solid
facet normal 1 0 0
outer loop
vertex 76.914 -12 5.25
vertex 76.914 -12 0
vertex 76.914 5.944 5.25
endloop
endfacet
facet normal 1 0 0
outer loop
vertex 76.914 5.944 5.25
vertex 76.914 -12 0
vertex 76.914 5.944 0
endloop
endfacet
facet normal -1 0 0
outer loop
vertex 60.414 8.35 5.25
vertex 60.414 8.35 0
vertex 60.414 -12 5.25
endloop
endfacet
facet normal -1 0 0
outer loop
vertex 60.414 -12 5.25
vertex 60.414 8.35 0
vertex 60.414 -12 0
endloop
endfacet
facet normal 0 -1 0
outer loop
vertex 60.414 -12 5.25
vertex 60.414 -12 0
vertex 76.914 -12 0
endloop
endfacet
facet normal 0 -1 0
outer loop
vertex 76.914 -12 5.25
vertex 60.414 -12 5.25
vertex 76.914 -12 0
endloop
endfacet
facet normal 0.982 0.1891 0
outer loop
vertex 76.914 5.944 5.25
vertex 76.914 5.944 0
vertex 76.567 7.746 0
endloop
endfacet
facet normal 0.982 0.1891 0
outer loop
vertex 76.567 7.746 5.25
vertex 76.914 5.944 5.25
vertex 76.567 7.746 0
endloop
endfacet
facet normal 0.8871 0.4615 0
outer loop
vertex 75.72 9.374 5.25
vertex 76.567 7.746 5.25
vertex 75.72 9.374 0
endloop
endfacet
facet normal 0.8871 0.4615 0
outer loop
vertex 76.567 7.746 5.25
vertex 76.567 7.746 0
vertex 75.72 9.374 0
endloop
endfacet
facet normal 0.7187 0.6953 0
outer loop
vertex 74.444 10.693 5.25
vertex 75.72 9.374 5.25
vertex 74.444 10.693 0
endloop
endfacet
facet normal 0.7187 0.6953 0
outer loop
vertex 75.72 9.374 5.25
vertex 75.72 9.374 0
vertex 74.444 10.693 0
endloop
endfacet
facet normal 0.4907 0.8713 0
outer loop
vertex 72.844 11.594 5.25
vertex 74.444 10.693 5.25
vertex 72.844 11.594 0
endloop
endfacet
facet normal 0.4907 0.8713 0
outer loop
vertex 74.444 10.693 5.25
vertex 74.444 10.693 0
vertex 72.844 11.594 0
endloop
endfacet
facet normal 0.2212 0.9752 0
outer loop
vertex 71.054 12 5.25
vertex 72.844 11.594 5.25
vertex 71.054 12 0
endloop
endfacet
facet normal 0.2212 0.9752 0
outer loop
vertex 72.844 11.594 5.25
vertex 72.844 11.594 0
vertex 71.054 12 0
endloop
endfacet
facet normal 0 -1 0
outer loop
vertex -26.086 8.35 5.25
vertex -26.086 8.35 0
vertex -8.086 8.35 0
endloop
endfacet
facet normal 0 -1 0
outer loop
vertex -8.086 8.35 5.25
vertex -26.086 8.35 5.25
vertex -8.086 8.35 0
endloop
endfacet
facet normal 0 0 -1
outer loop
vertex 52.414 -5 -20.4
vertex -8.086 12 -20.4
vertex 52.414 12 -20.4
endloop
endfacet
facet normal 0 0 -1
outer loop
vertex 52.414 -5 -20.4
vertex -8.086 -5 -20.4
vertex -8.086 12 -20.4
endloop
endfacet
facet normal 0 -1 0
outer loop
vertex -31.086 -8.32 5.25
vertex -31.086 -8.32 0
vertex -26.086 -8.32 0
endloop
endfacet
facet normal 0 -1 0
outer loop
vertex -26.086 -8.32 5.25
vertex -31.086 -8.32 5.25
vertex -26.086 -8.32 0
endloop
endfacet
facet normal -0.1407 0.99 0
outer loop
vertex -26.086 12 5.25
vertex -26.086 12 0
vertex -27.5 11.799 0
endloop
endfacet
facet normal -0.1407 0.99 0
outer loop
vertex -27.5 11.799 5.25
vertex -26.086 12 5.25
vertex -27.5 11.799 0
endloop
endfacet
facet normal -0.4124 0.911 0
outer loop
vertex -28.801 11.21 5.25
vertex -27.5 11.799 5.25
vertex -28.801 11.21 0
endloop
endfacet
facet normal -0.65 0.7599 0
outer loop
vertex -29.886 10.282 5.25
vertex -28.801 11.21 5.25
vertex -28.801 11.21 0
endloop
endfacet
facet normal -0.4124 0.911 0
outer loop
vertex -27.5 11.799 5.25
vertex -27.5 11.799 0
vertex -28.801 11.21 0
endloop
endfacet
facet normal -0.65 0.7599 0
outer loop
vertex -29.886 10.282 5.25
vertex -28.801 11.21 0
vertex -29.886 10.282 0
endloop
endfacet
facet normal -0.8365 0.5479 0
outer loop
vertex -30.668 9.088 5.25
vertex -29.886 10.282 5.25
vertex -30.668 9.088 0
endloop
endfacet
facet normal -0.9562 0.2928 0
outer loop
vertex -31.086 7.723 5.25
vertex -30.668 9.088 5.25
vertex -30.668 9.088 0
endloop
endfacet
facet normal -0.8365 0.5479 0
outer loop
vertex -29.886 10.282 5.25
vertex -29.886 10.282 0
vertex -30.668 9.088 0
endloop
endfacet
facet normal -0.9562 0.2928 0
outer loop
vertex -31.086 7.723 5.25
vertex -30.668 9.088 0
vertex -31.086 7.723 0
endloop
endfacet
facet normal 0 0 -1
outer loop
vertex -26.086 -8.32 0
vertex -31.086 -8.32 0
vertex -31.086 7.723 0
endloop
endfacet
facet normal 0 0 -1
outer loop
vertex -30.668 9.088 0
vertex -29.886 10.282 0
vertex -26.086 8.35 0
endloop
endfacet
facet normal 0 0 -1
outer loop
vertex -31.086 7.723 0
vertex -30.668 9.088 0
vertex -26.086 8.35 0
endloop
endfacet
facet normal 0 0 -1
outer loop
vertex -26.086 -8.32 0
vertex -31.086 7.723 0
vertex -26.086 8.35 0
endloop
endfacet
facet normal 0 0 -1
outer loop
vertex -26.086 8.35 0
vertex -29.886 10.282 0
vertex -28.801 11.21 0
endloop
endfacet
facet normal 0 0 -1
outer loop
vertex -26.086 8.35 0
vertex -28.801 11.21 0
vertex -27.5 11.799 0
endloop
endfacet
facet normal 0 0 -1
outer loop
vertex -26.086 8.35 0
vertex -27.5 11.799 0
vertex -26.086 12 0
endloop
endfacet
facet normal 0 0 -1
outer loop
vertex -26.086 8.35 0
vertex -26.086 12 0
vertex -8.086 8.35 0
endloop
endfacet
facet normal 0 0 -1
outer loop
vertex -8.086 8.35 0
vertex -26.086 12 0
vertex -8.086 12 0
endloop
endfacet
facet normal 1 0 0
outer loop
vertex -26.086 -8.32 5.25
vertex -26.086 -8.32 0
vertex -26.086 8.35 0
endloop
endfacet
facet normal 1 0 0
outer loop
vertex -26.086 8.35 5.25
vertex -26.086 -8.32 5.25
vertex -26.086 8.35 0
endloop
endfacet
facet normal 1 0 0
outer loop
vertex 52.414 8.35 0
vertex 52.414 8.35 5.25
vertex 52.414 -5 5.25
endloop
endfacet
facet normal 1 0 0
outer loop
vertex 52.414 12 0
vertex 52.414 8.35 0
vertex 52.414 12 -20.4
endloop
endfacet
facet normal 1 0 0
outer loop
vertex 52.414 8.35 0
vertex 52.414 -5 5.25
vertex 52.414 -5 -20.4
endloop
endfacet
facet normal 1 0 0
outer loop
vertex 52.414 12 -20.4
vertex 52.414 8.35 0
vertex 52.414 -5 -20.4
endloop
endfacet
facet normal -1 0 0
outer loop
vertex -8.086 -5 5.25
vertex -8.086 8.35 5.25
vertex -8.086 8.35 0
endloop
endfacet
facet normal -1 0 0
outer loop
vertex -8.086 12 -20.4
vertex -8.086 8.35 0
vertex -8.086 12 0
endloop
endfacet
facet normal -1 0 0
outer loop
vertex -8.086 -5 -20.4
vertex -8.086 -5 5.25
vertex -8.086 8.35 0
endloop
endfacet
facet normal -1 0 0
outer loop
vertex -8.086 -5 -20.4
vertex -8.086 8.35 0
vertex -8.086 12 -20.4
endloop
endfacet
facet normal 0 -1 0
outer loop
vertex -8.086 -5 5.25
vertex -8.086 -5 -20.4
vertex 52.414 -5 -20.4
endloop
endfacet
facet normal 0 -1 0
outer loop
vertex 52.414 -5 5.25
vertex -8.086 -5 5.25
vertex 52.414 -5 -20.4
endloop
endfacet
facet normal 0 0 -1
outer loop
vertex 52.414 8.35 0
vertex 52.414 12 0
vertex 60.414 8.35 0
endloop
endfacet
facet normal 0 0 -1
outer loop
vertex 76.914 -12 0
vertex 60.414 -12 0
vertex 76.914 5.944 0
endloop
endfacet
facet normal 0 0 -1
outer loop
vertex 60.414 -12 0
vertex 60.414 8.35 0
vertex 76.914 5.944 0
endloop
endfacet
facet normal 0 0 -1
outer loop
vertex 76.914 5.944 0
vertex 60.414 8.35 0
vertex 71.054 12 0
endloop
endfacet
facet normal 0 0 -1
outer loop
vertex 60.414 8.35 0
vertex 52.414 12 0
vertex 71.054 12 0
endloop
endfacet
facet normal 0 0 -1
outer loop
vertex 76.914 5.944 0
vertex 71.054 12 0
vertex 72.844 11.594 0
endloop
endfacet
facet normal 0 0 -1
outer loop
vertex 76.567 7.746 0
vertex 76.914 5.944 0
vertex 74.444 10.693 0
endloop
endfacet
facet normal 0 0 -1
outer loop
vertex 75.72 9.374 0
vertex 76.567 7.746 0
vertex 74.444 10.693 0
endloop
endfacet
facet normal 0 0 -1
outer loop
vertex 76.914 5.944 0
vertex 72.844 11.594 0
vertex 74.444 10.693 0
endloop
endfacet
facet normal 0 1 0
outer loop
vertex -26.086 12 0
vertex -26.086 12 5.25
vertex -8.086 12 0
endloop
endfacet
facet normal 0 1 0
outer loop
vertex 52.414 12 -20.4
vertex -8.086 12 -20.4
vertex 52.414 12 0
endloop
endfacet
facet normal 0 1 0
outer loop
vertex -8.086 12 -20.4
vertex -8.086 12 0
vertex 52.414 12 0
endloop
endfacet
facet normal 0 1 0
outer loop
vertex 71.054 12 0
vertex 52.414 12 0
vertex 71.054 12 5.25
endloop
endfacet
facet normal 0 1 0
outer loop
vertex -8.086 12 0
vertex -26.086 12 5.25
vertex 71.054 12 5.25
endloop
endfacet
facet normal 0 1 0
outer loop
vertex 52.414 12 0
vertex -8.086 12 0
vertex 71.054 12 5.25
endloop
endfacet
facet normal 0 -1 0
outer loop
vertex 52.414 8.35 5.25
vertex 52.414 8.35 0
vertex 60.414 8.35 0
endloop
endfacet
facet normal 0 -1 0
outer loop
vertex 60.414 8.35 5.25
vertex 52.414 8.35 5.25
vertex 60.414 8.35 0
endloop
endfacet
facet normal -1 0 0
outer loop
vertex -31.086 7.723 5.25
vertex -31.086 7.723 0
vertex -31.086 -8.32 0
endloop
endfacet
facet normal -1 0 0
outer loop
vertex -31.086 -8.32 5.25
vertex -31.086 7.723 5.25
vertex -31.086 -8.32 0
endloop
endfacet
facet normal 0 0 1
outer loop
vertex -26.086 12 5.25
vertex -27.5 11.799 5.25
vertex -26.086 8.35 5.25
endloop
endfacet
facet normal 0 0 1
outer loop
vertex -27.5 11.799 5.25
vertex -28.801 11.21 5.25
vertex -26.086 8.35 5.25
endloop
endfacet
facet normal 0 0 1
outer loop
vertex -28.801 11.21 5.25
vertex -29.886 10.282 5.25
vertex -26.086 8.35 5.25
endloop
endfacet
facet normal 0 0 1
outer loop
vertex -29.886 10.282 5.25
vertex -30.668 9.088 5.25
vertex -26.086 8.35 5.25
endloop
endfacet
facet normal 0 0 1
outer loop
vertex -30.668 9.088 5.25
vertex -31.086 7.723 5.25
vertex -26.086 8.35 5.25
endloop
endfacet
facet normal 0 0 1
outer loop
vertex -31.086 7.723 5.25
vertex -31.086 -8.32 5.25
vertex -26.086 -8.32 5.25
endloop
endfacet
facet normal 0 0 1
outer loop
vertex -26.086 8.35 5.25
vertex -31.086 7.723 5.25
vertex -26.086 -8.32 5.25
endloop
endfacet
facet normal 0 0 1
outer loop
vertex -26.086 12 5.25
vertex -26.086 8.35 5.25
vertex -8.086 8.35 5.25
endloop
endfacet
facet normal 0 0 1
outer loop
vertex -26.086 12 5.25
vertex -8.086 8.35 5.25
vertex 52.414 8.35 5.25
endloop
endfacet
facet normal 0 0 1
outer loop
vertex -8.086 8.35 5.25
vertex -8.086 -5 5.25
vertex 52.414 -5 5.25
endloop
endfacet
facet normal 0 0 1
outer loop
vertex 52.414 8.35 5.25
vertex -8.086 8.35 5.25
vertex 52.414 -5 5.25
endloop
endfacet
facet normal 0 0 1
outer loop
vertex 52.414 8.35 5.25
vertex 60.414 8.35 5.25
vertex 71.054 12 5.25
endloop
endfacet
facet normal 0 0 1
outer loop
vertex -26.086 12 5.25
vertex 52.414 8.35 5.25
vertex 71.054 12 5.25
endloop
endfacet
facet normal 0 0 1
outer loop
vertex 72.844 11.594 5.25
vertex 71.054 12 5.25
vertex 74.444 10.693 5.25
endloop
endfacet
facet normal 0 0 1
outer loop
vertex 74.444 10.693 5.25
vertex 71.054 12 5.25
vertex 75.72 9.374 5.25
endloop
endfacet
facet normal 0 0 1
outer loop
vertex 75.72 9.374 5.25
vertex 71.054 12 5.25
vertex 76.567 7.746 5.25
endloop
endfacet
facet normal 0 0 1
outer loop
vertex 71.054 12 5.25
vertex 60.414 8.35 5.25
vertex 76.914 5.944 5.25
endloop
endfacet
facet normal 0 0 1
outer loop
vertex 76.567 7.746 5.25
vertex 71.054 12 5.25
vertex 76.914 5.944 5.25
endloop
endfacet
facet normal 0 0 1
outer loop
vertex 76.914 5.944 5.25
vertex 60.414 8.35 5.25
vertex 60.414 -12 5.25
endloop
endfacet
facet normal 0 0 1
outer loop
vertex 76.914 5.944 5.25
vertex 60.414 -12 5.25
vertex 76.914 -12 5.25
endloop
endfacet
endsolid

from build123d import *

# Parameters (mm, degrees)
F0_W     = 60.5
F0_H     = 6.85
F1_DEPTH = 5.25
F2_DEPTH = 20.4
F3_W     = 60.5
F3_H     = 20.4
F4_DEPTH = 3
F5_DEPTH = 7
F6_DEPTH = 14
F7_DEPTH = 7.1
F8_DEPTH = 5.25
F9_DEPTH = 0.25


with BuildPart() as f1:
    # F0 (on Top) → F1 (new body)
    with BuildSketch(Plane.XY):
        with BuildLine():
            Line((71.054384552, 12), (70.0535051376, 12))
            Line((70.0535051376, 12), (60.4137502015, 12))
            Line((60.4137502015, 12), (60.4137502015, 8.35))
            Line((60.4137502015, 8.35), (60.4137502015, -12))
            Line((60.4137502015, -12), (76.9137502015, -12))
            Line((76.9137502015, -12), (76.9137502015, 5.3627402522))
            Line((76.9137502015, 5.3627402522), (76.9137502015, 5.9437831573))
            ThreePointArc((76.9137502015, 5.9437831573), (75.1294427626, 10.0800376979), (71.054384552, 12))
        make_face()
        with BuildLine():
            Line((-26.0862497985, -8.32), (-26.0862497985, 8.35))
            Line((-26.0862497985, 8.35), (-26.0862497985, 12))
            ThreePointArc((-26.0862497985, 12), (-29.3762488381, 10.7847383112), (-31.0862497985, 7.7225738205))
            Line((-31.0862497985, 7.7225738205), (-31.0862497985, -8.32))
            Line((-31.0862497985, -8.32), (-26.0862497985, -8.32))
        make_face()
        Polygon((60.4137502015, 8.35), (60.4137502015, 12), (52.4137502015, 12), (-8.0862497985, 12), (-26.0862497985, 12), (-26.0862497985, 8.35), align=None)
        with Locations((22.1637502015, 15.425)):
            Rectangle(F0_W, F0_H)
    extrude(amount=F1_DEPTH)

    # F0 (on Top) → F2 (join)
    with BuildSketch(Plane.XY):
        with Locations((22.1637502015, 15.425)):
            Rectangle(F0_W, F0_H)
    extrude(amount=-F2_DEPTH)

    # F3 (on face) → F4 (join)
    with BuildSketch(Plane.XZ.offset(-12)):
        with Locations((22.1637502015, -10.2)):
            Rectangle(F3_W, F3_H)
    extrude(amount=F4_DEPTH)

    # F5 (add): a face of the model
    f5_faces = [f1.faces().sort_by_distance(p)[0] for p in [
        (22.1637502015, 18.85, -7.575),
    ]]
    extrude(f5_faces, amount=-F5_DEPTH)

    # F6 (add): a face of the model
    f6_faces = [f1.faces().sort_by_distance(p)[0] for p in [
        (22.1637502015, 9, -10.2),
    ]]
    extrude(f6_faces, amount=F6_DEPTH)

    # F7 (cut): a face of the model
    f7_faces = [f1.faces().sort_by_distance(p)[0] for p in [
        (22.1637502015, 18.85, -7.575),
    ]]
    extrude(f7_faces, amount=-F7_DEPTH, mode=Mode.SUBTRACT)

    # F8 (add): a face of the model
    f8_faces = [f1.faces().sort_by_distance(p)[0] for p in [
        (22.1637502015, 1.675, 0),
    ]]
    extrude(f8_faces, amount=F8_DEPTH)

    # F9 (add): a face of the model
    f9_faces = [f1.faces().sort_by_distance(p)[0] for p in [
        (22.1637502015, 11.75, -7.575),
    ]]
    extrude(f9_faces, amount=F9_DEPTH)


solid = f1.part
